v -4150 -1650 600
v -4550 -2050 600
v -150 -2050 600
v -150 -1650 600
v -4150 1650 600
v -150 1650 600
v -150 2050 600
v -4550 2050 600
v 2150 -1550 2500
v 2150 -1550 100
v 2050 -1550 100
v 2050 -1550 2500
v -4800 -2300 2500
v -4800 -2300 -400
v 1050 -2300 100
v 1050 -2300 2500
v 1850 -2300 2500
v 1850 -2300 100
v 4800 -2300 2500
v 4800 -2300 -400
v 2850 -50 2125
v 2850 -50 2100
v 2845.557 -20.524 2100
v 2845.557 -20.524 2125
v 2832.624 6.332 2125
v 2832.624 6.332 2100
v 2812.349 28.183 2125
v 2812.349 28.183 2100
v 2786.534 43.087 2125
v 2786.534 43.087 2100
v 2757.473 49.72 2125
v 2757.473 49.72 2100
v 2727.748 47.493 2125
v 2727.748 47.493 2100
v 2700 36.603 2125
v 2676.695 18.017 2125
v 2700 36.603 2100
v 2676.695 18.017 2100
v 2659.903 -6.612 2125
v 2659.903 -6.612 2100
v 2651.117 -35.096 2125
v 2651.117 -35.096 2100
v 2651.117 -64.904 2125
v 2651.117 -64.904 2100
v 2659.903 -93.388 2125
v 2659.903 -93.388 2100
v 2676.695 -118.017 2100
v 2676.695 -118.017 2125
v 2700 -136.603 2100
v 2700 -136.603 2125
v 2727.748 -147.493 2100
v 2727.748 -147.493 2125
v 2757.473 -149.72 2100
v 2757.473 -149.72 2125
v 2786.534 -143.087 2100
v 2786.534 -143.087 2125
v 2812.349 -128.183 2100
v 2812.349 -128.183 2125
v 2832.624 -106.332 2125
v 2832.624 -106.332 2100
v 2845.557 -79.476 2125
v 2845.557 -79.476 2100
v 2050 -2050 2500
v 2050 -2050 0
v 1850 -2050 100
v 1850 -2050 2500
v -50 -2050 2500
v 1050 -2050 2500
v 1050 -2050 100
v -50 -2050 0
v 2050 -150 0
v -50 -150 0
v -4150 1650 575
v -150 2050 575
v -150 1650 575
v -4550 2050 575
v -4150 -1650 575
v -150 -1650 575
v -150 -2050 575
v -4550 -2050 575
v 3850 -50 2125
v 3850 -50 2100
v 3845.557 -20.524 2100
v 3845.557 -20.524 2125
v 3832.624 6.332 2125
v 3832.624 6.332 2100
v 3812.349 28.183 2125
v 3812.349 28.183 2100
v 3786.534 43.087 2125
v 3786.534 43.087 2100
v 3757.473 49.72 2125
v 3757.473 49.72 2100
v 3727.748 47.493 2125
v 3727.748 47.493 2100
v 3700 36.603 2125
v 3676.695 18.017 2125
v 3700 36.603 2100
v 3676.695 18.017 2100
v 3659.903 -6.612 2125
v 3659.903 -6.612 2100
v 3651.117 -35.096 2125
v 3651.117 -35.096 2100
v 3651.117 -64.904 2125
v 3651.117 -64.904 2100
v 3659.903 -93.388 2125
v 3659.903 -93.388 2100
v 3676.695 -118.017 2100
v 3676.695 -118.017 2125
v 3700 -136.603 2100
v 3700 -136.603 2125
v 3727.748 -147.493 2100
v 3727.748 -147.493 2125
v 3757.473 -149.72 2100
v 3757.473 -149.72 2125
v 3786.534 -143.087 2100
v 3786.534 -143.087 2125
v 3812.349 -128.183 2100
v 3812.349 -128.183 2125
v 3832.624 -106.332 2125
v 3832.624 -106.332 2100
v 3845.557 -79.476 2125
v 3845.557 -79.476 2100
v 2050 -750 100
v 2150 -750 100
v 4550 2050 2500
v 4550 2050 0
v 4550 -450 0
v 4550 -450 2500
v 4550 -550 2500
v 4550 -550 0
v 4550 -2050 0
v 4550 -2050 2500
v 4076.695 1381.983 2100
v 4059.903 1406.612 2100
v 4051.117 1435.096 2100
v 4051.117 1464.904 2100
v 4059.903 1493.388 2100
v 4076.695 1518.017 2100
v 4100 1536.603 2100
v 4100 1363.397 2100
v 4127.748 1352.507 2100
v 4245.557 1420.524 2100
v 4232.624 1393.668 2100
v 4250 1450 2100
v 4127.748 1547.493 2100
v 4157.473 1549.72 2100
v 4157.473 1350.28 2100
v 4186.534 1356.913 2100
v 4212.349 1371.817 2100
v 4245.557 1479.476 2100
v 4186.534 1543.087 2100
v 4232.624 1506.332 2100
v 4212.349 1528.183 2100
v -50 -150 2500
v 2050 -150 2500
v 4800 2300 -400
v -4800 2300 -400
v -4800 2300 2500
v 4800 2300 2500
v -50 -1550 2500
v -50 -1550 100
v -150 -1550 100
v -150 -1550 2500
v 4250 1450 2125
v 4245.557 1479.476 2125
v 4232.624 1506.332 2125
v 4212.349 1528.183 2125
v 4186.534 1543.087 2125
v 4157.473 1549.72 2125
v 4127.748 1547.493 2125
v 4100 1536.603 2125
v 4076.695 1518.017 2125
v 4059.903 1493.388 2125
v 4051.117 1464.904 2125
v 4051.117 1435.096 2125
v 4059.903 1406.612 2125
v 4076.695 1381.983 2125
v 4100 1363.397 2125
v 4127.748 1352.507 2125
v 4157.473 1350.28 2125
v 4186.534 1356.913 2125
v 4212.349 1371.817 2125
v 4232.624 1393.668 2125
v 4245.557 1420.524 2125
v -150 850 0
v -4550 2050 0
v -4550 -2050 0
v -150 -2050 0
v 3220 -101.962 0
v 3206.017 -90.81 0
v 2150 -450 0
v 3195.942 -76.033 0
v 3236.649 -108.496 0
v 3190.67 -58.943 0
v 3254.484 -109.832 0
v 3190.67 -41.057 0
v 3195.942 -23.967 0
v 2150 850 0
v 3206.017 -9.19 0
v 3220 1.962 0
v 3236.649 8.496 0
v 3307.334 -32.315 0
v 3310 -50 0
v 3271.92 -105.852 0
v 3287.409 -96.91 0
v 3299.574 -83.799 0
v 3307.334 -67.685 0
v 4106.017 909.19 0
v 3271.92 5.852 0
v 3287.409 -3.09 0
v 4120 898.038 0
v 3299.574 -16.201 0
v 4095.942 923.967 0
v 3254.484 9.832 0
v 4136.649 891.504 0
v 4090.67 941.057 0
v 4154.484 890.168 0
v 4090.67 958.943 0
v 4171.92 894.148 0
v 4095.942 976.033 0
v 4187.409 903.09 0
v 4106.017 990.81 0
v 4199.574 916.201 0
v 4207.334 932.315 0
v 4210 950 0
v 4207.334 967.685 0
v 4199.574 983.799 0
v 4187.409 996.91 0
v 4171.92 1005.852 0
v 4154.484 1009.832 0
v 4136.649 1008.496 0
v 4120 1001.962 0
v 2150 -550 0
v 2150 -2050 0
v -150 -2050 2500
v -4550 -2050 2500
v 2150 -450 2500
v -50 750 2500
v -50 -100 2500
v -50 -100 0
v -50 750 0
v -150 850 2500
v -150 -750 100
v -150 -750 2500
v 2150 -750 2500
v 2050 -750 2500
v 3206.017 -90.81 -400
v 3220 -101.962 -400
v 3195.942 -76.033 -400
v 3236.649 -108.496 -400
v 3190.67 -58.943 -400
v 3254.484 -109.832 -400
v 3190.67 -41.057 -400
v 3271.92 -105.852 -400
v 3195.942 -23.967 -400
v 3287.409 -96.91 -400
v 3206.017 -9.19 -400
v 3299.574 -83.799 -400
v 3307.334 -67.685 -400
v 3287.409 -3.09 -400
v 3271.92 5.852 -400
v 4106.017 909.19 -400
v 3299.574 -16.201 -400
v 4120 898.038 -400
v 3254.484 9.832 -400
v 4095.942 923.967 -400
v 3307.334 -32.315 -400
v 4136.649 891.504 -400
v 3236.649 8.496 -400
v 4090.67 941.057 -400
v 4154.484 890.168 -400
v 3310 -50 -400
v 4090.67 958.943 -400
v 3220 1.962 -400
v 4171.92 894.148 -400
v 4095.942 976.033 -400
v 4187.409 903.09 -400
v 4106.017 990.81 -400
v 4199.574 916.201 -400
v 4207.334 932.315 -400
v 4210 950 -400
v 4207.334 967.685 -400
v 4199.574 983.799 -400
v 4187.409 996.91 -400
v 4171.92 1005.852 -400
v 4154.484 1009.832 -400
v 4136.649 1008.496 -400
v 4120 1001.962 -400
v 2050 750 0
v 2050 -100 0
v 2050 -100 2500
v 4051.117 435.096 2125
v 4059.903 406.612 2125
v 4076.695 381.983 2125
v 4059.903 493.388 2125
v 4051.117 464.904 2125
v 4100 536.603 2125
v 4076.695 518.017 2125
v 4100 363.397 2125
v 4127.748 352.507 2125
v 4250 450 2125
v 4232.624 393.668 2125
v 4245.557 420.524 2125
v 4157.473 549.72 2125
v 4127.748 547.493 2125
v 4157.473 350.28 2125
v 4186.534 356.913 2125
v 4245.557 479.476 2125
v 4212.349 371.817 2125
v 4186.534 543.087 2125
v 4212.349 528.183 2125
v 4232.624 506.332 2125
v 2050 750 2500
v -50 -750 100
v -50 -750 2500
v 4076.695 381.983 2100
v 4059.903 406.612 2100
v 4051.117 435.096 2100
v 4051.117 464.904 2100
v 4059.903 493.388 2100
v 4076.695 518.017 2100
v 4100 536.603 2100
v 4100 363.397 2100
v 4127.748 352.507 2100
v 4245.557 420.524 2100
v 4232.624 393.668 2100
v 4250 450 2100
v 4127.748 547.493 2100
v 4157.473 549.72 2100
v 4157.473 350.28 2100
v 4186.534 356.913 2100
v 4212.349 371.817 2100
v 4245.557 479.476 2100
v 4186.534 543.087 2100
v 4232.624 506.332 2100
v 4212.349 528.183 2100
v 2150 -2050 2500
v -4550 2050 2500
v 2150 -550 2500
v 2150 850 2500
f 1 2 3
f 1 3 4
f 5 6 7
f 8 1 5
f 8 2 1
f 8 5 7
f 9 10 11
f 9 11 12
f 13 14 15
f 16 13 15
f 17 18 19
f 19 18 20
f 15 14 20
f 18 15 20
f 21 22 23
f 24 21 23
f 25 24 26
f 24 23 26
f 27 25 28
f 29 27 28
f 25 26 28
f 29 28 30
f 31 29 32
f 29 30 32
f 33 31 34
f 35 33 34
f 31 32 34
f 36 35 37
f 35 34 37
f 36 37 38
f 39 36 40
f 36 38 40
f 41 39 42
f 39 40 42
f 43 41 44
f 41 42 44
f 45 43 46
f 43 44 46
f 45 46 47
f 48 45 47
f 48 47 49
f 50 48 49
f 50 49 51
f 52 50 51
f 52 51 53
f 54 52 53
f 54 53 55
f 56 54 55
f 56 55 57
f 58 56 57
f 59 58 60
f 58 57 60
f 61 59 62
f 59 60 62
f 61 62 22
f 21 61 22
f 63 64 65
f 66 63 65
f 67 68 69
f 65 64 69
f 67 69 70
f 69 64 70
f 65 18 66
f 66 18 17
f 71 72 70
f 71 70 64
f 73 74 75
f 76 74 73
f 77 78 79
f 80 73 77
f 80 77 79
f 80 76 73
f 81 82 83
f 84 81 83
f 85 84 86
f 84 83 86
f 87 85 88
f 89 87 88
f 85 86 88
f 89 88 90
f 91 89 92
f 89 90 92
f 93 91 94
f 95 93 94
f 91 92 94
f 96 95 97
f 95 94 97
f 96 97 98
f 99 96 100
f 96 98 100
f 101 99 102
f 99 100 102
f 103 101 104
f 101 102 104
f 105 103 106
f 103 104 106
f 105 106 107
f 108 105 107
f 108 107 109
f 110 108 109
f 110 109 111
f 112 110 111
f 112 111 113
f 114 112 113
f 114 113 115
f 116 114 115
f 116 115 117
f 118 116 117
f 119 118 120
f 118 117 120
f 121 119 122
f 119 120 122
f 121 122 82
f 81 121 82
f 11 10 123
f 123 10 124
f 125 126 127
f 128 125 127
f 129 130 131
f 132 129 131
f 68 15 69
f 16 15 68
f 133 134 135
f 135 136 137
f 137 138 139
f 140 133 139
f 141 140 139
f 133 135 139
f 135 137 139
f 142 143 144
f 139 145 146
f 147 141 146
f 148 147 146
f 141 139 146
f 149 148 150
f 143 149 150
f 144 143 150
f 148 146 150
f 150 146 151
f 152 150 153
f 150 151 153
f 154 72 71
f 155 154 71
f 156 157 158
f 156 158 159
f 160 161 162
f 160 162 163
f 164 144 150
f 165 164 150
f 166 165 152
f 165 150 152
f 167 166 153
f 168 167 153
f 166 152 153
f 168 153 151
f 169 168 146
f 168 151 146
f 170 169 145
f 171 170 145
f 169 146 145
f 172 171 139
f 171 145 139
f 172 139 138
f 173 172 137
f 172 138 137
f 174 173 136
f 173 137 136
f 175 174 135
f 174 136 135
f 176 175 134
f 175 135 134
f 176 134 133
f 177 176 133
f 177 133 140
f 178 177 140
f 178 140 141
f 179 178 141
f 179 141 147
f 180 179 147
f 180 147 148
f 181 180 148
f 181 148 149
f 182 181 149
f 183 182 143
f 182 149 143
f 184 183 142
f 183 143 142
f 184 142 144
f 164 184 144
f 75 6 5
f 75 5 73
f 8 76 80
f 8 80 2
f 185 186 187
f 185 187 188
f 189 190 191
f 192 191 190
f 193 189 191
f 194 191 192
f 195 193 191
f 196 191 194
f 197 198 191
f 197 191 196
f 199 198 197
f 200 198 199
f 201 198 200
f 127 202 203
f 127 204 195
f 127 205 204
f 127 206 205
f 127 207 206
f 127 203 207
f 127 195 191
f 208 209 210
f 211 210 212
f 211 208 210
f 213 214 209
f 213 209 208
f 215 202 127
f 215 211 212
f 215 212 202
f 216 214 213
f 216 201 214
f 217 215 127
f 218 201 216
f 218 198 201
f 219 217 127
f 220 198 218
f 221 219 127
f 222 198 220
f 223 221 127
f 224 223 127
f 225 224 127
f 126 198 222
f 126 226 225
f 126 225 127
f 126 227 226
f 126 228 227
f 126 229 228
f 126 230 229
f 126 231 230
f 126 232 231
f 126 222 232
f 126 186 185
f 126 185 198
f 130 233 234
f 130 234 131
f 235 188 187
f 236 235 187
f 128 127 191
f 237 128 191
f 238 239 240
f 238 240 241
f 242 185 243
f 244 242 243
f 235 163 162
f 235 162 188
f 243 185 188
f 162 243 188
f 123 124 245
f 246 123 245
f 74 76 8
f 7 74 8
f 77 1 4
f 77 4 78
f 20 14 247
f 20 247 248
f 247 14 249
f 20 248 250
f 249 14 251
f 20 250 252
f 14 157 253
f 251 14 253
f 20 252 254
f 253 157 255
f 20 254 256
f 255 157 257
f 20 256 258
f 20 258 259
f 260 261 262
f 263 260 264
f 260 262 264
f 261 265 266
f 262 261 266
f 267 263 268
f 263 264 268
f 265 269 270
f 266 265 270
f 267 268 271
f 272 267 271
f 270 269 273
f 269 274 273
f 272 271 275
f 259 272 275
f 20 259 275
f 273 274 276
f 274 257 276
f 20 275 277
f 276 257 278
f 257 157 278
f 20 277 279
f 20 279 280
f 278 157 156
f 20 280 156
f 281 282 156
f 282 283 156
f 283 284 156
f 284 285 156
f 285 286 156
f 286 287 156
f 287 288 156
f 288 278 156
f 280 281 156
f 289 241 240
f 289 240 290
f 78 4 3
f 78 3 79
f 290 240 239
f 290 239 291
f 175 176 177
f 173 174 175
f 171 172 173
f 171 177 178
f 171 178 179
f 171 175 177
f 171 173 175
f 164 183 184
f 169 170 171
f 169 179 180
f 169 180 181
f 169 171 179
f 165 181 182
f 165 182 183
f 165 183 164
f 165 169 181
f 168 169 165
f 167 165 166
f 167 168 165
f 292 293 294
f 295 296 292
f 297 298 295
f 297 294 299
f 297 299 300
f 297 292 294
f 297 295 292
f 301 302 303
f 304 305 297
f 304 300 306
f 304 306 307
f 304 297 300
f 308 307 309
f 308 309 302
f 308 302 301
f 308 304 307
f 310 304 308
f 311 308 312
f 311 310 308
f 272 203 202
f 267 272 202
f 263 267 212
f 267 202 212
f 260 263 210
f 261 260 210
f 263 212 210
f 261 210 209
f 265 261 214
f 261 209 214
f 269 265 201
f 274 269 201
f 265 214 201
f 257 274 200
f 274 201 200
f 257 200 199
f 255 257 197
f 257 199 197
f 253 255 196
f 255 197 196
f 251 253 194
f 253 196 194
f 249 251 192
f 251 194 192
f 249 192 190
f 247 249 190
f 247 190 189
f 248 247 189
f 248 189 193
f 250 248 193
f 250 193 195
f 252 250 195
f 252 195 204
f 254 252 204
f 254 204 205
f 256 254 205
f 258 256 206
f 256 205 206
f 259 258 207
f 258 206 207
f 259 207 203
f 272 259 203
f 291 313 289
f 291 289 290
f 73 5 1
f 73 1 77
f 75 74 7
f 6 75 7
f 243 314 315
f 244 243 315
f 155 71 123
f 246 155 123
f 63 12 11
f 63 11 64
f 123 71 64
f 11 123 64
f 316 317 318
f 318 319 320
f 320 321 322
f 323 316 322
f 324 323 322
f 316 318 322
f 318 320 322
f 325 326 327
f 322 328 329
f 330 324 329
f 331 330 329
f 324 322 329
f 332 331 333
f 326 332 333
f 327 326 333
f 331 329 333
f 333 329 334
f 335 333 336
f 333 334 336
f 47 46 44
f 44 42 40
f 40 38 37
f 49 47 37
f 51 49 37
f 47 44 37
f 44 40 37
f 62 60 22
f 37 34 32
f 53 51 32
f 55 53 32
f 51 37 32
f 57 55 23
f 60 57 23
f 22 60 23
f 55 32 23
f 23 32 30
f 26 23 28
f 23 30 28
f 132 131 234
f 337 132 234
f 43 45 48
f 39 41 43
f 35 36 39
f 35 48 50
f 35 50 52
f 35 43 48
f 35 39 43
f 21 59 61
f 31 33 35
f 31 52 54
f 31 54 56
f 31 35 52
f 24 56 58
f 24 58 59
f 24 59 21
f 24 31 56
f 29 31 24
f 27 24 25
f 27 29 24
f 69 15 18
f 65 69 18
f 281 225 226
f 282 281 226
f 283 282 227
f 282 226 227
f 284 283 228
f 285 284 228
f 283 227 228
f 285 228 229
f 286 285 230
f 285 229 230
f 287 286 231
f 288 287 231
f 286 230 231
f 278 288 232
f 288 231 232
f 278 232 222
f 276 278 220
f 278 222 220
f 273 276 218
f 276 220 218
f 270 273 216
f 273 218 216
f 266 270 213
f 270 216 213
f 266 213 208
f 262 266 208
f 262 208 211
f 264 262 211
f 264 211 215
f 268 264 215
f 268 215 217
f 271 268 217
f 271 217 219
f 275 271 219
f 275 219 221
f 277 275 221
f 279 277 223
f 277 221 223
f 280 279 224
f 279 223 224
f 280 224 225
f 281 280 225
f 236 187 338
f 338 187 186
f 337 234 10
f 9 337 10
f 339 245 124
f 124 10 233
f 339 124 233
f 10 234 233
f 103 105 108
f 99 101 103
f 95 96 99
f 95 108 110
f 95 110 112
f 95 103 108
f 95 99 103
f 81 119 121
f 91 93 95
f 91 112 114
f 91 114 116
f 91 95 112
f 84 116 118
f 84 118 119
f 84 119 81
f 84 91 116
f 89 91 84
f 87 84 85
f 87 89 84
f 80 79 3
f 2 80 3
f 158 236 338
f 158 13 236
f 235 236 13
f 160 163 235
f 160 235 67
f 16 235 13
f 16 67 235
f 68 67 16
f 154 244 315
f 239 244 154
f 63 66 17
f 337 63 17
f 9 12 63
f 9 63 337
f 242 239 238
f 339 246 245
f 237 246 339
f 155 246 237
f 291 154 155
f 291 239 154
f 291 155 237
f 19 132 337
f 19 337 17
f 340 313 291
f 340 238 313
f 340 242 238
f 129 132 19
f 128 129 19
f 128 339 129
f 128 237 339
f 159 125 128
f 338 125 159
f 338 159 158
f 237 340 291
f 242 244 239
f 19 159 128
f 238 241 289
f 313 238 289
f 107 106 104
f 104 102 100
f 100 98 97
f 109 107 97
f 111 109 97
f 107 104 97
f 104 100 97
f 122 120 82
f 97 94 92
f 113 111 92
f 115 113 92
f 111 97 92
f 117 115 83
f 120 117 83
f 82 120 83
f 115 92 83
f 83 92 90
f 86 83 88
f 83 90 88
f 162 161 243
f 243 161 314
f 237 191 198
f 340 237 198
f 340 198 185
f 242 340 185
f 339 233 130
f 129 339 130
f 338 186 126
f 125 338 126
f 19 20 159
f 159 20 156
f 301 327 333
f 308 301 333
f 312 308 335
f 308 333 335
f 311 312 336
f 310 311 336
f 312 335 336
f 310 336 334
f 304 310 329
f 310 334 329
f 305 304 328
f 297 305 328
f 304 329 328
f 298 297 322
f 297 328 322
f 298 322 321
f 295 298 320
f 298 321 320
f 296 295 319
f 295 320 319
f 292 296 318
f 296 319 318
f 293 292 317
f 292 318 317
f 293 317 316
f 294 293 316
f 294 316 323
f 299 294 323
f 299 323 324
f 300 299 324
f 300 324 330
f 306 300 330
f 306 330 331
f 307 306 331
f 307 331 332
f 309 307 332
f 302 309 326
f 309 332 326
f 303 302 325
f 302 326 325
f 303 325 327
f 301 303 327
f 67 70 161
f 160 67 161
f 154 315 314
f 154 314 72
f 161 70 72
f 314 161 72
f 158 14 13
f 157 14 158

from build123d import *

# Parameters (mm, degrees)
F0_W      = 9600
F0_H      = 4600
F0_R      = 60
F0_W_2    = 2100
F0_H_2    = 2800
F0_W_3    = 2400
F0_H_3    = 1500
F1_DEPTH  = 400
F2_DEPTH  = 2500
F3_W      = 800
F3_H      = 2500
F4_DEPTH  = 400
F5_W      = 800
F5_H      = 2500
F6_DEPTH  = 4000
F10_W     = 400
F10_H     = 25
F13_R     = 100
F14_DEPTH = 25
F15_W     = 2100
F15_H     = 50
F16_DEPTH = 2500


with BuildPart() as f1:
    # F0 (on Top) → F1 (new body)
    with BuildSketch(Plane.XY):
        Rectangle(F0_W, F0_H)
        Polygon((4550, -550), (4550, -2050), (2150, -2050), (2050, -2050), (-50, -2050), (-150, -2050), (-4550, -2050), (-4550, 2050), (4550, 2050), (4550, -450), align=None, mode=Mode.SUBTRACT)
        Polygon((2150, -450), (4550, -450), (4550, 2050), (-4550, 2050), (-4550, -2050), (-150, -2050), (-150, 850), (2050, 850), (2150, 850), align=None)
        with Locations((3250, -50)):
            Circle(F0_R, mode=Mode.SUBTRACT)
        with Locations((4150, 950)):
            Circle(F0_R, mode=Mode.SUBTRACT)
        with Locations((1000, -650)):
            Rectangle(F0_W_2, F0_H_2)
        with Locations((3350, -1300)):
            Rectangle(F0_W_3, F0_H_3)
        Polygon((2050, -2050), (2150, -2050), (2150, -550), (4550, -550), (4550, -450), (2150, -450), (2150, 850), (2050, 850), (2050, 750), align=None)
        Polygon((-150, -2050), (-50, -2050), (-50, 750), (2050, 750), (2050, 850), (-150, 850), align=None)
    extrude(amount=-F1_DEPTH)

    # F0 (on Top) → F2 (join)
    with BuildSketch(Plane.XY):
        Rectangle(F0_W, F0_H)
        Polygon((4550, -550), (4550, -2050), (2150, -2050), (2050, -2050), (-50, -2050), (-150, -2050), (-4550, -2050), (-4550, 2050), (4550, 2050), (4550, -450), align=None, mode=Mode.SUBTRACT)
        Polygon((2050, -2050), (2150, -2050), (2150, -550), (4550, -550), (4550, -450), (2150, -450), (2150, 850), (2050, 850), (2050, 750), align=None)
        Polygon((-150, -2050), (-50, -2050), (-50, 750), (2050, 750), (2050, 850), (-150, 850), align=None)
    extrude(amount=F2_DEPTH)

    # F3 (on face) → F4 (cut)
    with BuildSketch(Plane.XZ.offset(2300)):
        with Locations((1450, 1350)):
            Rectangle(F3_W, F3_H)
    extrude(amount=-F4_DEPTH, mode=Mode.SUBTRACT)

    # F5 (on face) → F6 (cut)
    with BuildSketch(Plane.YZ.offset(2150)):
        with Locations((-1150, 1350)):
            Rectangle(F5_W, F5_H)
    extrude(amount=-F6_DEPTH, mode=Mode.SUBTRACT)

    # F15 (on face) → F16 (join)
    with BuildSketch(Plane.XY):
        with Locations((1000, -125)):
            Rectangle(F15_W, F15_H)
    extrude(amount=F16_DEPTH)


with BuildPart() as f11:
    # F11: sweep along a path in F9
    with BuildLine(Plane.XY.offset(600)) as f11_path:
        Line((-150, -2050), (-4550, -2050))
        Line((-4550, -2050), (-4550, 2050))
        Line((-4550, 2050), (-150, 2050))
    # F10 (on face) → F11 (sweep)
    with BuildSketch(Plane(origin=(-150, 0, 0), x_dir=(0, -1, 0), z_dir=(-1, 0, 0))):
        with Locations((1850, 587.5)):
            Rectangle(F10_W, F10_H)
    sweep(path=f11_path.line, transition=Transition.RIGHT)


with BuildPart() as f14:
    # F13 (on offset) → F14 (new body)
    with BuildSketch(Plane.XY.offset(2100)):
        with Locations((2750, -50)):
            Circle(F13_R)
    extrude(amount=F14_DEPTH)


with BuildPart() as f14b:
    # F13 (on offset) → F14, piece 2 (new body)
    with BuildSketch(Plane.XY.offset(2100)):
        with Locations((4150, 1450)):
            Circle(F13_R)
    extrude(amount=F14_DEPTH)


with BuildPart() as f14c:
    # F13 (on offset) → F14, piece 3 (new body)
    with BuildSketch(Plane.XY.offset(2100)):
        with Locations((4150, 450)):
            Circle(F13_R)
    extrude(amount=F14_DEPTH)


with BuildPart() as f14d:
    # F13 (on offset) → F14, piece 4 (new body)
    with BuildSketch(Plane.XY.offset(2100)):
        with Locations((3750, -50)):
            Circle(F13_R)
    extrude(amount=F14_DEPTH)


solid = Compound([f1.part, f11.part, f14.part, f14b.part, f14c.part, f14d.part])
